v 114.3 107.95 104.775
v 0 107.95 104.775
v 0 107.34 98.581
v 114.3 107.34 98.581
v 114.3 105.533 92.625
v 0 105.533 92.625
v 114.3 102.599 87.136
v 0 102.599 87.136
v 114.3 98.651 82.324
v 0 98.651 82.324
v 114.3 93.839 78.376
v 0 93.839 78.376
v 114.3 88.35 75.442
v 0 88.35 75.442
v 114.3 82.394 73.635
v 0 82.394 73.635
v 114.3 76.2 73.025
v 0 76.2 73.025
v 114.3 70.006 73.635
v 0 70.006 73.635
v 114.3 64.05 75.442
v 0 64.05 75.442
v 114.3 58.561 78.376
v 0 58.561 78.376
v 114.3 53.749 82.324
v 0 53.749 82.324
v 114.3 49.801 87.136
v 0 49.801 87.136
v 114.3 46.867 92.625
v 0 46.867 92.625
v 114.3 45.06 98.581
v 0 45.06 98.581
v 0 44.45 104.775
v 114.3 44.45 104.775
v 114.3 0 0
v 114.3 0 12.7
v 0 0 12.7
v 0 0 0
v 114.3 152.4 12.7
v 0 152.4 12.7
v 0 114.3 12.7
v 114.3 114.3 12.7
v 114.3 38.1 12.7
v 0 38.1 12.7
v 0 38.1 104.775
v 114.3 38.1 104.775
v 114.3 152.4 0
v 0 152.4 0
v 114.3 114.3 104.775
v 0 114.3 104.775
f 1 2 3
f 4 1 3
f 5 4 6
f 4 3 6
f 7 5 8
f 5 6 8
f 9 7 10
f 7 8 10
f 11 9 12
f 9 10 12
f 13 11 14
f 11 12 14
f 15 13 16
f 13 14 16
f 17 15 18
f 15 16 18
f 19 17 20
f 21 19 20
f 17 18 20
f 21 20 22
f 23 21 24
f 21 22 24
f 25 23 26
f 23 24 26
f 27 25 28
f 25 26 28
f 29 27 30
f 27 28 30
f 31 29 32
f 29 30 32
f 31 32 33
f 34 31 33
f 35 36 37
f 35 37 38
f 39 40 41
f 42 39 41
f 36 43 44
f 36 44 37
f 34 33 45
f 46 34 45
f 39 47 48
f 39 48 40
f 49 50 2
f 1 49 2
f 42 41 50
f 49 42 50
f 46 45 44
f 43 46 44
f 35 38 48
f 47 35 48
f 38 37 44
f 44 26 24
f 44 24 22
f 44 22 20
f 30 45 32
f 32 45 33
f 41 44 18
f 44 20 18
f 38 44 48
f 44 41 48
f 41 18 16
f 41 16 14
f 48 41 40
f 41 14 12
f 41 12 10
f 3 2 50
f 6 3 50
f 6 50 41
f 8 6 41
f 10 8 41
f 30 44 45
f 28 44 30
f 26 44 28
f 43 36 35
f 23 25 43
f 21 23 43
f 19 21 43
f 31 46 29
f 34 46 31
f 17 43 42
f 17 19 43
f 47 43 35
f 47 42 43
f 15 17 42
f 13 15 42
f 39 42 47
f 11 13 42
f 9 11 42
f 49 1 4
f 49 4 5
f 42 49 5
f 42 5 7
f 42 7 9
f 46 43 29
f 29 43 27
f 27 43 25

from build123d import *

# Parameters (mm, degrees)
F1_DEPTH = 114.3


with BuildPart() as f1:
    # F0 (on Right) → F1 (new body)
    with BuildSketch(Plane.YZ):
        with BuildLine():
            Line((0, 12.7), (0, 0))
            Line((0, 0), (152.4, 0))
            Line((152.4, 0), (152.4, 12.7))
            Line((152.4, 12.7), (114.3, 12.7))
            Line((114.3, 12.7), (114.3, 104.775))
            Line((114.3, 104.775), (107.95, 104.775))
            ThreePointArc((107.95, 104.775), (76.2, 73.025), (44.45, 104.775))
            Line((44.45, 104.775), (38.1, 104.775))
            Line((38.1, 104.775), (38.1, 12.7))
            Line((38.1, 12.7), (0, 12.7))
        make_face()
    extrude(amount=F1_DEPTH)


solid = f1.part
